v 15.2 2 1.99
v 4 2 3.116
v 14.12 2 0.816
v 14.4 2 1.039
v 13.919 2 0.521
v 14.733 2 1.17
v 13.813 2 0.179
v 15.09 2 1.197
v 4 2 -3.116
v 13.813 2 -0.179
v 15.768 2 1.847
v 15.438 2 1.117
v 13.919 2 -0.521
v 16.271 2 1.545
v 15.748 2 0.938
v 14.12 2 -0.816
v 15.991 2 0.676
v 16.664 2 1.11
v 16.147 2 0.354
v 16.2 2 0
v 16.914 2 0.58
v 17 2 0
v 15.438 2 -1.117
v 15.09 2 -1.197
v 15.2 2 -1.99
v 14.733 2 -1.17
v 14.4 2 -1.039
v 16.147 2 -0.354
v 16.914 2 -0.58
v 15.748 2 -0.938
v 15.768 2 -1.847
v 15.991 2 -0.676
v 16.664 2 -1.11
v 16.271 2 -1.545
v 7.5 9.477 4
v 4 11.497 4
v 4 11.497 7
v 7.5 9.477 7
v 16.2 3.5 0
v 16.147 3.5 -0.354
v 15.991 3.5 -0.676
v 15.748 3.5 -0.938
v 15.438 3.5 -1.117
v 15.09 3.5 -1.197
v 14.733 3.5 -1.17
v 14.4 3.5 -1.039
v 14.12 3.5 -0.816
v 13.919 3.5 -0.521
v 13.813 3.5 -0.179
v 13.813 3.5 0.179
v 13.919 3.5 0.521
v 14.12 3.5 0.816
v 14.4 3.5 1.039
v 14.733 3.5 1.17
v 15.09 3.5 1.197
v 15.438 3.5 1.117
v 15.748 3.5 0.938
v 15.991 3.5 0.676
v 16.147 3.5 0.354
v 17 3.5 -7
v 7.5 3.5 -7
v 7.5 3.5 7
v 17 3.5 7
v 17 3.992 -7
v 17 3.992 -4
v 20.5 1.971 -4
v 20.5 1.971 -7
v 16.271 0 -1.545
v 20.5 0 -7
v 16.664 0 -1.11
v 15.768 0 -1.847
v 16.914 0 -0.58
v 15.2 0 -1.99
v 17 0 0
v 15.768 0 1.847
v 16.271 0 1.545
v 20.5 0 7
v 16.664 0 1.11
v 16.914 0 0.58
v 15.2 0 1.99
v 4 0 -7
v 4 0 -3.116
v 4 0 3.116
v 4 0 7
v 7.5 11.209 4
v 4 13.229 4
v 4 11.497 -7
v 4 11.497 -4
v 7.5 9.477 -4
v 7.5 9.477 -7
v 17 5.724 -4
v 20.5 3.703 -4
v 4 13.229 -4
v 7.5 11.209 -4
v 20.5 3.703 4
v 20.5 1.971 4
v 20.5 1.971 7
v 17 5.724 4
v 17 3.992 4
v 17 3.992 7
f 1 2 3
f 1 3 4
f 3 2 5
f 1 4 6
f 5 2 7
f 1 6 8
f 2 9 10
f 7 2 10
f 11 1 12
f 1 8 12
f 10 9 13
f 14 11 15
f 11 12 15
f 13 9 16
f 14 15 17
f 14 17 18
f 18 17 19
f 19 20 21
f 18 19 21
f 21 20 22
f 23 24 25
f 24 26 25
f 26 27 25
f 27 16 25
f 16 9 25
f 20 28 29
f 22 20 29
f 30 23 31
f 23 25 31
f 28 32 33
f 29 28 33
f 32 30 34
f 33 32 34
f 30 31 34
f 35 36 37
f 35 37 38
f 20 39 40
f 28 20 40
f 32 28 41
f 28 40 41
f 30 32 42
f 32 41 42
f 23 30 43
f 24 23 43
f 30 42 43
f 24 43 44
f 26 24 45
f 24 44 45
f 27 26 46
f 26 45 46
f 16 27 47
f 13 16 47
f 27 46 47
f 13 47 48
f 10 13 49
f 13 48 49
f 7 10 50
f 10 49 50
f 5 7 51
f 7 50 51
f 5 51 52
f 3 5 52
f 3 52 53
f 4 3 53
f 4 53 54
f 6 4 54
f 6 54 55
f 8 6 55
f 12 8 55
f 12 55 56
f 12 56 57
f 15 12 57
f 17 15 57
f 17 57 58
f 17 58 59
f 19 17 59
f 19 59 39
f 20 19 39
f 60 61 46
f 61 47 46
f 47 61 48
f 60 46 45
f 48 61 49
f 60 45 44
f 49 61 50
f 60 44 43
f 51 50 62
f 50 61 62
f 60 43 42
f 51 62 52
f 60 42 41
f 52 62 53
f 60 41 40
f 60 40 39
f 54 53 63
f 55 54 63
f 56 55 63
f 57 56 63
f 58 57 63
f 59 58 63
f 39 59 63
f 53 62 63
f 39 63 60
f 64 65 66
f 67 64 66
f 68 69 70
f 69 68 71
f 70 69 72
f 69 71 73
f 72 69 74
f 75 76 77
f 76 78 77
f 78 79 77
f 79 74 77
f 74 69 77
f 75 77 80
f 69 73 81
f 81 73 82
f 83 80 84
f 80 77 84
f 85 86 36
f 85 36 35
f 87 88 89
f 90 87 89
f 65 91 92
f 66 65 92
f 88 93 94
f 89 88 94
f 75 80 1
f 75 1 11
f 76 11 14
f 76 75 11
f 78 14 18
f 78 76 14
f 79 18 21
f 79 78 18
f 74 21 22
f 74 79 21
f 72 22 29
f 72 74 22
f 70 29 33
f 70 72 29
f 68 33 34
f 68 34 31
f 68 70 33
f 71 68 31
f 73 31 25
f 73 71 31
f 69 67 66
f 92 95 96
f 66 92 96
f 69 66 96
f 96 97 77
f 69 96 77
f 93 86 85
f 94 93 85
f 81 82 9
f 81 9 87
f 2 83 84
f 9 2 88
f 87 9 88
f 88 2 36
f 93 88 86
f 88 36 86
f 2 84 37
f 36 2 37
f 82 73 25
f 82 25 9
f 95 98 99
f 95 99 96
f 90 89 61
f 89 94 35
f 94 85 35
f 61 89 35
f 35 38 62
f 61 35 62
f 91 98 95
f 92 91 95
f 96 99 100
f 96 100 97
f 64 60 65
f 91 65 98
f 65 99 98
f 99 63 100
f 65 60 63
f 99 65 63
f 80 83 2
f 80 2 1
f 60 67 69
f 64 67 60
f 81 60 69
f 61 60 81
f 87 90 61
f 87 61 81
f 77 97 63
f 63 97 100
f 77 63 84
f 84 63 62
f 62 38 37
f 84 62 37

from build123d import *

# Parameters (mm, degrees)
BOSS_EXTRU_1_DEPTH      = 7
ENL_V_START             = -4
ENL_V_MAT_EXTRU_1_DEPTH = 22.382453919
D_GAGEMENT_M21_D        = 2.4
EMPREINTE1_OUTLINE_R    = 1.2
EMPREINTE1_DEPTH        = 2


# Read off the part's stored shape, not the designer's step: Empreinte1
with BuildPart() as part:
    # Esquisse1 → Boss.-Extru.1 (new, symmetric)
    with BuildSketch(Plane.XY):
        Polygon((4, 0), (4, 13.229473419), (7.5, 11.208747477), (7.5, 3.5), (17, 3.5), (17, 5.72391992), (20.5, 3.703193978), (20.5, 0), align=None)
    extrude(amount=BOSS_EXTRU_1_DEPTH, both=True)

    # Esquisse2 → Enlèv. mat.-Extru.1 (cut, through all)
    with BuildSketch(Plane.XY.offset(ENL_V_START)):
        Polygon((4, 13.229473419), (4, 11.497422612), (7.5, 9.47669667), (7.5, 11.208747477), align=None)
        Polygon((17, 5.72391992), (17, 3.991869112), (20.5, 1.97114317), (20.5, 3.703193978), align=None)
    enl_v_mat_extru_1 = extrude(amount=-ENL_V_MAT_EXTRU_1_DEPTH, mode=Mode.SUBTRACT)

    # Symétrie1: Enlèv. mat.-Extru.1 across plane
    add(enl_v_mat_extru_1.mirror(Plane.XY), mode=Mode.SUBTRACT)

    # Dégagement M21 (through all)
    with Locations(Plane(origin=(0, 0, 0), x_dir=(-1, 0, 0), z_dir=(0, -1, 0))):
        with Locations((-15, 0)):
            Hole(D_GAGEMENT_M21_D / 2)

    # Empreinte1 outline → Empreinte1 (cut)
    with BuildSketch(Plane(origin=(0, 0, 0), x_dir=(1, 0, 0), z_dir=(0, 1, 0))):
        with BuildLine():
            Line((4, -3.115617227), (15.2, -1.989974874))
            ThreePointArc((15.2, -1.989974874), (17, 0), (15.2, 1.989974874))
            Line((15.2, 1.989974874), (4, 3.115617227))
            Line((4, 3.115617227), (4, -3.115617227))
        make_face()
        with Locations((15, 0)):
            Circle(EMPREINTE1_OUTLINE_R, mode=Mode.SUBTRACT)
    extrude(amount=EMPREINTE1_DEPTH, mode=Mode.SUBTRACT)


solid = part.part
